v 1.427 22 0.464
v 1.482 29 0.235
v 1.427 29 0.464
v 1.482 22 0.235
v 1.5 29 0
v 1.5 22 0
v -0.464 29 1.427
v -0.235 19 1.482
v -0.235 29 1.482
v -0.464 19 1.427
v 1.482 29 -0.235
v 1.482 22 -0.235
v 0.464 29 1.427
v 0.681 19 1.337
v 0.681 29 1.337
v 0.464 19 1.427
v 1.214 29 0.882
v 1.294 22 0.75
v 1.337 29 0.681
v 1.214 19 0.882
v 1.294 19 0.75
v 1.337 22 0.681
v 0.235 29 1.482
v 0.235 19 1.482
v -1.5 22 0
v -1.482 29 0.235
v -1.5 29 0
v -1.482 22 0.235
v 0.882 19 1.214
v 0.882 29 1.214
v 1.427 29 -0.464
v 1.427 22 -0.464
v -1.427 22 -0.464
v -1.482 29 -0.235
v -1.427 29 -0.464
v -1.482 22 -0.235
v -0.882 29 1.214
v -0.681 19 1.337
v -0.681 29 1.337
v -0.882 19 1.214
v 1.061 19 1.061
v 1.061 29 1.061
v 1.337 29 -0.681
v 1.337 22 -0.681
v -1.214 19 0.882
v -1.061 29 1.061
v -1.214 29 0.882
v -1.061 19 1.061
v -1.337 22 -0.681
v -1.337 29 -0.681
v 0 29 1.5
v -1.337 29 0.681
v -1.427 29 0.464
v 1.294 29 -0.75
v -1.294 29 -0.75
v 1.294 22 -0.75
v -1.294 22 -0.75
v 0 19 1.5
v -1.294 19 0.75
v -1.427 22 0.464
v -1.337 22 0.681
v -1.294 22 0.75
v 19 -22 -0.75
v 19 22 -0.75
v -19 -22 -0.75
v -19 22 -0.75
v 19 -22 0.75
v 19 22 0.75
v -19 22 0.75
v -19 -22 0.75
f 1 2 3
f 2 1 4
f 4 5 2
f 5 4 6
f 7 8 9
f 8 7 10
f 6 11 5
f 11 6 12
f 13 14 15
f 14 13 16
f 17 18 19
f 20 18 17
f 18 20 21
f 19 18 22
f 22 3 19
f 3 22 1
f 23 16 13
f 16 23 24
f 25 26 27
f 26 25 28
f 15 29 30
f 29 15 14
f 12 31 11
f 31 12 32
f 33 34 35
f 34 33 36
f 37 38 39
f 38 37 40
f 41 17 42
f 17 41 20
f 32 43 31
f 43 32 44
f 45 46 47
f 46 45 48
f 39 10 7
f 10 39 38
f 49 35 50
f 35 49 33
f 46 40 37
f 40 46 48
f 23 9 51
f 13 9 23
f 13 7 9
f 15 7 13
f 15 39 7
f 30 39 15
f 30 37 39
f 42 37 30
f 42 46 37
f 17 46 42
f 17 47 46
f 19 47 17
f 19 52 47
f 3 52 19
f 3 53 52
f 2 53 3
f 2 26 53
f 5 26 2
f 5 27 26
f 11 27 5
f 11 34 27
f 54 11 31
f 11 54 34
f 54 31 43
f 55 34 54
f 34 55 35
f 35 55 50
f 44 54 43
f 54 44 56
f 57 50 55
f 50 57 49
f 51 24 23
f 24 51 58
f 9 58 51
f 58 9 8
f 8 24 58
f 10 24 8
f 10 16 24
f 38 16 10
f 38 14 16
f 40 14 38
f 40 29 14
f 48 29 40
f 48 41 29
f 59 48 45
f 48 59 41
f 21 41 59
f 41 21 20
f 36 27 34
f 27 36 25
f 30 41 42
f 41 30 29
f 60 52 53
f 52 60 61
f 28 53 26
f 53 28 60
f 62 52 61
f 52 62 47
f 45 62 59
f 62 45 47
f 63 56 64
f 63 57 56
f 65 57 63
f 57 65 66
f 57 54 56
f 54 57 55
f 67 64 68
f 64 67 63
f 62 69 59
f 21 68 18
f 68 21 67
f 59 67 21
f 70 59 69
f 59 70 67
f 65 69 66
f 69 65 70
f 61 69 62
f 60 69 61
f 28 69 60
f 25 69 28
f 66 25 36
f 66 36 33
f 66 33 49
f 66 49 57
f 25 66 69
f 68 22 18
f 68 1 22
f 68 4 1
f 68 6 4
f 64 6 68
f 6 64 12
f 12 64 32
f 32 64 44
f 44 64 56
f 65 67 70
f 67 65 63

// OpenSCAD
//	Window Width
width = 38;
//	Window height
height = 44;
//	The smaller this number the more light that will be let through
thickness= 1.5;
// The default is for modio parts printed at 100% scale
post_diameter=3;

cube([width, height, thickness], center=true);
translate([0,.5*height+2,-.5*thickness])
difference(){
translate([0,0,.75])rotate([90,0,0])cylinder(10,post_diameter/2,post_diameter/2,$fn=40,center=true);
translate([0,0,-10])cube([20,12,20],center=true);
};
